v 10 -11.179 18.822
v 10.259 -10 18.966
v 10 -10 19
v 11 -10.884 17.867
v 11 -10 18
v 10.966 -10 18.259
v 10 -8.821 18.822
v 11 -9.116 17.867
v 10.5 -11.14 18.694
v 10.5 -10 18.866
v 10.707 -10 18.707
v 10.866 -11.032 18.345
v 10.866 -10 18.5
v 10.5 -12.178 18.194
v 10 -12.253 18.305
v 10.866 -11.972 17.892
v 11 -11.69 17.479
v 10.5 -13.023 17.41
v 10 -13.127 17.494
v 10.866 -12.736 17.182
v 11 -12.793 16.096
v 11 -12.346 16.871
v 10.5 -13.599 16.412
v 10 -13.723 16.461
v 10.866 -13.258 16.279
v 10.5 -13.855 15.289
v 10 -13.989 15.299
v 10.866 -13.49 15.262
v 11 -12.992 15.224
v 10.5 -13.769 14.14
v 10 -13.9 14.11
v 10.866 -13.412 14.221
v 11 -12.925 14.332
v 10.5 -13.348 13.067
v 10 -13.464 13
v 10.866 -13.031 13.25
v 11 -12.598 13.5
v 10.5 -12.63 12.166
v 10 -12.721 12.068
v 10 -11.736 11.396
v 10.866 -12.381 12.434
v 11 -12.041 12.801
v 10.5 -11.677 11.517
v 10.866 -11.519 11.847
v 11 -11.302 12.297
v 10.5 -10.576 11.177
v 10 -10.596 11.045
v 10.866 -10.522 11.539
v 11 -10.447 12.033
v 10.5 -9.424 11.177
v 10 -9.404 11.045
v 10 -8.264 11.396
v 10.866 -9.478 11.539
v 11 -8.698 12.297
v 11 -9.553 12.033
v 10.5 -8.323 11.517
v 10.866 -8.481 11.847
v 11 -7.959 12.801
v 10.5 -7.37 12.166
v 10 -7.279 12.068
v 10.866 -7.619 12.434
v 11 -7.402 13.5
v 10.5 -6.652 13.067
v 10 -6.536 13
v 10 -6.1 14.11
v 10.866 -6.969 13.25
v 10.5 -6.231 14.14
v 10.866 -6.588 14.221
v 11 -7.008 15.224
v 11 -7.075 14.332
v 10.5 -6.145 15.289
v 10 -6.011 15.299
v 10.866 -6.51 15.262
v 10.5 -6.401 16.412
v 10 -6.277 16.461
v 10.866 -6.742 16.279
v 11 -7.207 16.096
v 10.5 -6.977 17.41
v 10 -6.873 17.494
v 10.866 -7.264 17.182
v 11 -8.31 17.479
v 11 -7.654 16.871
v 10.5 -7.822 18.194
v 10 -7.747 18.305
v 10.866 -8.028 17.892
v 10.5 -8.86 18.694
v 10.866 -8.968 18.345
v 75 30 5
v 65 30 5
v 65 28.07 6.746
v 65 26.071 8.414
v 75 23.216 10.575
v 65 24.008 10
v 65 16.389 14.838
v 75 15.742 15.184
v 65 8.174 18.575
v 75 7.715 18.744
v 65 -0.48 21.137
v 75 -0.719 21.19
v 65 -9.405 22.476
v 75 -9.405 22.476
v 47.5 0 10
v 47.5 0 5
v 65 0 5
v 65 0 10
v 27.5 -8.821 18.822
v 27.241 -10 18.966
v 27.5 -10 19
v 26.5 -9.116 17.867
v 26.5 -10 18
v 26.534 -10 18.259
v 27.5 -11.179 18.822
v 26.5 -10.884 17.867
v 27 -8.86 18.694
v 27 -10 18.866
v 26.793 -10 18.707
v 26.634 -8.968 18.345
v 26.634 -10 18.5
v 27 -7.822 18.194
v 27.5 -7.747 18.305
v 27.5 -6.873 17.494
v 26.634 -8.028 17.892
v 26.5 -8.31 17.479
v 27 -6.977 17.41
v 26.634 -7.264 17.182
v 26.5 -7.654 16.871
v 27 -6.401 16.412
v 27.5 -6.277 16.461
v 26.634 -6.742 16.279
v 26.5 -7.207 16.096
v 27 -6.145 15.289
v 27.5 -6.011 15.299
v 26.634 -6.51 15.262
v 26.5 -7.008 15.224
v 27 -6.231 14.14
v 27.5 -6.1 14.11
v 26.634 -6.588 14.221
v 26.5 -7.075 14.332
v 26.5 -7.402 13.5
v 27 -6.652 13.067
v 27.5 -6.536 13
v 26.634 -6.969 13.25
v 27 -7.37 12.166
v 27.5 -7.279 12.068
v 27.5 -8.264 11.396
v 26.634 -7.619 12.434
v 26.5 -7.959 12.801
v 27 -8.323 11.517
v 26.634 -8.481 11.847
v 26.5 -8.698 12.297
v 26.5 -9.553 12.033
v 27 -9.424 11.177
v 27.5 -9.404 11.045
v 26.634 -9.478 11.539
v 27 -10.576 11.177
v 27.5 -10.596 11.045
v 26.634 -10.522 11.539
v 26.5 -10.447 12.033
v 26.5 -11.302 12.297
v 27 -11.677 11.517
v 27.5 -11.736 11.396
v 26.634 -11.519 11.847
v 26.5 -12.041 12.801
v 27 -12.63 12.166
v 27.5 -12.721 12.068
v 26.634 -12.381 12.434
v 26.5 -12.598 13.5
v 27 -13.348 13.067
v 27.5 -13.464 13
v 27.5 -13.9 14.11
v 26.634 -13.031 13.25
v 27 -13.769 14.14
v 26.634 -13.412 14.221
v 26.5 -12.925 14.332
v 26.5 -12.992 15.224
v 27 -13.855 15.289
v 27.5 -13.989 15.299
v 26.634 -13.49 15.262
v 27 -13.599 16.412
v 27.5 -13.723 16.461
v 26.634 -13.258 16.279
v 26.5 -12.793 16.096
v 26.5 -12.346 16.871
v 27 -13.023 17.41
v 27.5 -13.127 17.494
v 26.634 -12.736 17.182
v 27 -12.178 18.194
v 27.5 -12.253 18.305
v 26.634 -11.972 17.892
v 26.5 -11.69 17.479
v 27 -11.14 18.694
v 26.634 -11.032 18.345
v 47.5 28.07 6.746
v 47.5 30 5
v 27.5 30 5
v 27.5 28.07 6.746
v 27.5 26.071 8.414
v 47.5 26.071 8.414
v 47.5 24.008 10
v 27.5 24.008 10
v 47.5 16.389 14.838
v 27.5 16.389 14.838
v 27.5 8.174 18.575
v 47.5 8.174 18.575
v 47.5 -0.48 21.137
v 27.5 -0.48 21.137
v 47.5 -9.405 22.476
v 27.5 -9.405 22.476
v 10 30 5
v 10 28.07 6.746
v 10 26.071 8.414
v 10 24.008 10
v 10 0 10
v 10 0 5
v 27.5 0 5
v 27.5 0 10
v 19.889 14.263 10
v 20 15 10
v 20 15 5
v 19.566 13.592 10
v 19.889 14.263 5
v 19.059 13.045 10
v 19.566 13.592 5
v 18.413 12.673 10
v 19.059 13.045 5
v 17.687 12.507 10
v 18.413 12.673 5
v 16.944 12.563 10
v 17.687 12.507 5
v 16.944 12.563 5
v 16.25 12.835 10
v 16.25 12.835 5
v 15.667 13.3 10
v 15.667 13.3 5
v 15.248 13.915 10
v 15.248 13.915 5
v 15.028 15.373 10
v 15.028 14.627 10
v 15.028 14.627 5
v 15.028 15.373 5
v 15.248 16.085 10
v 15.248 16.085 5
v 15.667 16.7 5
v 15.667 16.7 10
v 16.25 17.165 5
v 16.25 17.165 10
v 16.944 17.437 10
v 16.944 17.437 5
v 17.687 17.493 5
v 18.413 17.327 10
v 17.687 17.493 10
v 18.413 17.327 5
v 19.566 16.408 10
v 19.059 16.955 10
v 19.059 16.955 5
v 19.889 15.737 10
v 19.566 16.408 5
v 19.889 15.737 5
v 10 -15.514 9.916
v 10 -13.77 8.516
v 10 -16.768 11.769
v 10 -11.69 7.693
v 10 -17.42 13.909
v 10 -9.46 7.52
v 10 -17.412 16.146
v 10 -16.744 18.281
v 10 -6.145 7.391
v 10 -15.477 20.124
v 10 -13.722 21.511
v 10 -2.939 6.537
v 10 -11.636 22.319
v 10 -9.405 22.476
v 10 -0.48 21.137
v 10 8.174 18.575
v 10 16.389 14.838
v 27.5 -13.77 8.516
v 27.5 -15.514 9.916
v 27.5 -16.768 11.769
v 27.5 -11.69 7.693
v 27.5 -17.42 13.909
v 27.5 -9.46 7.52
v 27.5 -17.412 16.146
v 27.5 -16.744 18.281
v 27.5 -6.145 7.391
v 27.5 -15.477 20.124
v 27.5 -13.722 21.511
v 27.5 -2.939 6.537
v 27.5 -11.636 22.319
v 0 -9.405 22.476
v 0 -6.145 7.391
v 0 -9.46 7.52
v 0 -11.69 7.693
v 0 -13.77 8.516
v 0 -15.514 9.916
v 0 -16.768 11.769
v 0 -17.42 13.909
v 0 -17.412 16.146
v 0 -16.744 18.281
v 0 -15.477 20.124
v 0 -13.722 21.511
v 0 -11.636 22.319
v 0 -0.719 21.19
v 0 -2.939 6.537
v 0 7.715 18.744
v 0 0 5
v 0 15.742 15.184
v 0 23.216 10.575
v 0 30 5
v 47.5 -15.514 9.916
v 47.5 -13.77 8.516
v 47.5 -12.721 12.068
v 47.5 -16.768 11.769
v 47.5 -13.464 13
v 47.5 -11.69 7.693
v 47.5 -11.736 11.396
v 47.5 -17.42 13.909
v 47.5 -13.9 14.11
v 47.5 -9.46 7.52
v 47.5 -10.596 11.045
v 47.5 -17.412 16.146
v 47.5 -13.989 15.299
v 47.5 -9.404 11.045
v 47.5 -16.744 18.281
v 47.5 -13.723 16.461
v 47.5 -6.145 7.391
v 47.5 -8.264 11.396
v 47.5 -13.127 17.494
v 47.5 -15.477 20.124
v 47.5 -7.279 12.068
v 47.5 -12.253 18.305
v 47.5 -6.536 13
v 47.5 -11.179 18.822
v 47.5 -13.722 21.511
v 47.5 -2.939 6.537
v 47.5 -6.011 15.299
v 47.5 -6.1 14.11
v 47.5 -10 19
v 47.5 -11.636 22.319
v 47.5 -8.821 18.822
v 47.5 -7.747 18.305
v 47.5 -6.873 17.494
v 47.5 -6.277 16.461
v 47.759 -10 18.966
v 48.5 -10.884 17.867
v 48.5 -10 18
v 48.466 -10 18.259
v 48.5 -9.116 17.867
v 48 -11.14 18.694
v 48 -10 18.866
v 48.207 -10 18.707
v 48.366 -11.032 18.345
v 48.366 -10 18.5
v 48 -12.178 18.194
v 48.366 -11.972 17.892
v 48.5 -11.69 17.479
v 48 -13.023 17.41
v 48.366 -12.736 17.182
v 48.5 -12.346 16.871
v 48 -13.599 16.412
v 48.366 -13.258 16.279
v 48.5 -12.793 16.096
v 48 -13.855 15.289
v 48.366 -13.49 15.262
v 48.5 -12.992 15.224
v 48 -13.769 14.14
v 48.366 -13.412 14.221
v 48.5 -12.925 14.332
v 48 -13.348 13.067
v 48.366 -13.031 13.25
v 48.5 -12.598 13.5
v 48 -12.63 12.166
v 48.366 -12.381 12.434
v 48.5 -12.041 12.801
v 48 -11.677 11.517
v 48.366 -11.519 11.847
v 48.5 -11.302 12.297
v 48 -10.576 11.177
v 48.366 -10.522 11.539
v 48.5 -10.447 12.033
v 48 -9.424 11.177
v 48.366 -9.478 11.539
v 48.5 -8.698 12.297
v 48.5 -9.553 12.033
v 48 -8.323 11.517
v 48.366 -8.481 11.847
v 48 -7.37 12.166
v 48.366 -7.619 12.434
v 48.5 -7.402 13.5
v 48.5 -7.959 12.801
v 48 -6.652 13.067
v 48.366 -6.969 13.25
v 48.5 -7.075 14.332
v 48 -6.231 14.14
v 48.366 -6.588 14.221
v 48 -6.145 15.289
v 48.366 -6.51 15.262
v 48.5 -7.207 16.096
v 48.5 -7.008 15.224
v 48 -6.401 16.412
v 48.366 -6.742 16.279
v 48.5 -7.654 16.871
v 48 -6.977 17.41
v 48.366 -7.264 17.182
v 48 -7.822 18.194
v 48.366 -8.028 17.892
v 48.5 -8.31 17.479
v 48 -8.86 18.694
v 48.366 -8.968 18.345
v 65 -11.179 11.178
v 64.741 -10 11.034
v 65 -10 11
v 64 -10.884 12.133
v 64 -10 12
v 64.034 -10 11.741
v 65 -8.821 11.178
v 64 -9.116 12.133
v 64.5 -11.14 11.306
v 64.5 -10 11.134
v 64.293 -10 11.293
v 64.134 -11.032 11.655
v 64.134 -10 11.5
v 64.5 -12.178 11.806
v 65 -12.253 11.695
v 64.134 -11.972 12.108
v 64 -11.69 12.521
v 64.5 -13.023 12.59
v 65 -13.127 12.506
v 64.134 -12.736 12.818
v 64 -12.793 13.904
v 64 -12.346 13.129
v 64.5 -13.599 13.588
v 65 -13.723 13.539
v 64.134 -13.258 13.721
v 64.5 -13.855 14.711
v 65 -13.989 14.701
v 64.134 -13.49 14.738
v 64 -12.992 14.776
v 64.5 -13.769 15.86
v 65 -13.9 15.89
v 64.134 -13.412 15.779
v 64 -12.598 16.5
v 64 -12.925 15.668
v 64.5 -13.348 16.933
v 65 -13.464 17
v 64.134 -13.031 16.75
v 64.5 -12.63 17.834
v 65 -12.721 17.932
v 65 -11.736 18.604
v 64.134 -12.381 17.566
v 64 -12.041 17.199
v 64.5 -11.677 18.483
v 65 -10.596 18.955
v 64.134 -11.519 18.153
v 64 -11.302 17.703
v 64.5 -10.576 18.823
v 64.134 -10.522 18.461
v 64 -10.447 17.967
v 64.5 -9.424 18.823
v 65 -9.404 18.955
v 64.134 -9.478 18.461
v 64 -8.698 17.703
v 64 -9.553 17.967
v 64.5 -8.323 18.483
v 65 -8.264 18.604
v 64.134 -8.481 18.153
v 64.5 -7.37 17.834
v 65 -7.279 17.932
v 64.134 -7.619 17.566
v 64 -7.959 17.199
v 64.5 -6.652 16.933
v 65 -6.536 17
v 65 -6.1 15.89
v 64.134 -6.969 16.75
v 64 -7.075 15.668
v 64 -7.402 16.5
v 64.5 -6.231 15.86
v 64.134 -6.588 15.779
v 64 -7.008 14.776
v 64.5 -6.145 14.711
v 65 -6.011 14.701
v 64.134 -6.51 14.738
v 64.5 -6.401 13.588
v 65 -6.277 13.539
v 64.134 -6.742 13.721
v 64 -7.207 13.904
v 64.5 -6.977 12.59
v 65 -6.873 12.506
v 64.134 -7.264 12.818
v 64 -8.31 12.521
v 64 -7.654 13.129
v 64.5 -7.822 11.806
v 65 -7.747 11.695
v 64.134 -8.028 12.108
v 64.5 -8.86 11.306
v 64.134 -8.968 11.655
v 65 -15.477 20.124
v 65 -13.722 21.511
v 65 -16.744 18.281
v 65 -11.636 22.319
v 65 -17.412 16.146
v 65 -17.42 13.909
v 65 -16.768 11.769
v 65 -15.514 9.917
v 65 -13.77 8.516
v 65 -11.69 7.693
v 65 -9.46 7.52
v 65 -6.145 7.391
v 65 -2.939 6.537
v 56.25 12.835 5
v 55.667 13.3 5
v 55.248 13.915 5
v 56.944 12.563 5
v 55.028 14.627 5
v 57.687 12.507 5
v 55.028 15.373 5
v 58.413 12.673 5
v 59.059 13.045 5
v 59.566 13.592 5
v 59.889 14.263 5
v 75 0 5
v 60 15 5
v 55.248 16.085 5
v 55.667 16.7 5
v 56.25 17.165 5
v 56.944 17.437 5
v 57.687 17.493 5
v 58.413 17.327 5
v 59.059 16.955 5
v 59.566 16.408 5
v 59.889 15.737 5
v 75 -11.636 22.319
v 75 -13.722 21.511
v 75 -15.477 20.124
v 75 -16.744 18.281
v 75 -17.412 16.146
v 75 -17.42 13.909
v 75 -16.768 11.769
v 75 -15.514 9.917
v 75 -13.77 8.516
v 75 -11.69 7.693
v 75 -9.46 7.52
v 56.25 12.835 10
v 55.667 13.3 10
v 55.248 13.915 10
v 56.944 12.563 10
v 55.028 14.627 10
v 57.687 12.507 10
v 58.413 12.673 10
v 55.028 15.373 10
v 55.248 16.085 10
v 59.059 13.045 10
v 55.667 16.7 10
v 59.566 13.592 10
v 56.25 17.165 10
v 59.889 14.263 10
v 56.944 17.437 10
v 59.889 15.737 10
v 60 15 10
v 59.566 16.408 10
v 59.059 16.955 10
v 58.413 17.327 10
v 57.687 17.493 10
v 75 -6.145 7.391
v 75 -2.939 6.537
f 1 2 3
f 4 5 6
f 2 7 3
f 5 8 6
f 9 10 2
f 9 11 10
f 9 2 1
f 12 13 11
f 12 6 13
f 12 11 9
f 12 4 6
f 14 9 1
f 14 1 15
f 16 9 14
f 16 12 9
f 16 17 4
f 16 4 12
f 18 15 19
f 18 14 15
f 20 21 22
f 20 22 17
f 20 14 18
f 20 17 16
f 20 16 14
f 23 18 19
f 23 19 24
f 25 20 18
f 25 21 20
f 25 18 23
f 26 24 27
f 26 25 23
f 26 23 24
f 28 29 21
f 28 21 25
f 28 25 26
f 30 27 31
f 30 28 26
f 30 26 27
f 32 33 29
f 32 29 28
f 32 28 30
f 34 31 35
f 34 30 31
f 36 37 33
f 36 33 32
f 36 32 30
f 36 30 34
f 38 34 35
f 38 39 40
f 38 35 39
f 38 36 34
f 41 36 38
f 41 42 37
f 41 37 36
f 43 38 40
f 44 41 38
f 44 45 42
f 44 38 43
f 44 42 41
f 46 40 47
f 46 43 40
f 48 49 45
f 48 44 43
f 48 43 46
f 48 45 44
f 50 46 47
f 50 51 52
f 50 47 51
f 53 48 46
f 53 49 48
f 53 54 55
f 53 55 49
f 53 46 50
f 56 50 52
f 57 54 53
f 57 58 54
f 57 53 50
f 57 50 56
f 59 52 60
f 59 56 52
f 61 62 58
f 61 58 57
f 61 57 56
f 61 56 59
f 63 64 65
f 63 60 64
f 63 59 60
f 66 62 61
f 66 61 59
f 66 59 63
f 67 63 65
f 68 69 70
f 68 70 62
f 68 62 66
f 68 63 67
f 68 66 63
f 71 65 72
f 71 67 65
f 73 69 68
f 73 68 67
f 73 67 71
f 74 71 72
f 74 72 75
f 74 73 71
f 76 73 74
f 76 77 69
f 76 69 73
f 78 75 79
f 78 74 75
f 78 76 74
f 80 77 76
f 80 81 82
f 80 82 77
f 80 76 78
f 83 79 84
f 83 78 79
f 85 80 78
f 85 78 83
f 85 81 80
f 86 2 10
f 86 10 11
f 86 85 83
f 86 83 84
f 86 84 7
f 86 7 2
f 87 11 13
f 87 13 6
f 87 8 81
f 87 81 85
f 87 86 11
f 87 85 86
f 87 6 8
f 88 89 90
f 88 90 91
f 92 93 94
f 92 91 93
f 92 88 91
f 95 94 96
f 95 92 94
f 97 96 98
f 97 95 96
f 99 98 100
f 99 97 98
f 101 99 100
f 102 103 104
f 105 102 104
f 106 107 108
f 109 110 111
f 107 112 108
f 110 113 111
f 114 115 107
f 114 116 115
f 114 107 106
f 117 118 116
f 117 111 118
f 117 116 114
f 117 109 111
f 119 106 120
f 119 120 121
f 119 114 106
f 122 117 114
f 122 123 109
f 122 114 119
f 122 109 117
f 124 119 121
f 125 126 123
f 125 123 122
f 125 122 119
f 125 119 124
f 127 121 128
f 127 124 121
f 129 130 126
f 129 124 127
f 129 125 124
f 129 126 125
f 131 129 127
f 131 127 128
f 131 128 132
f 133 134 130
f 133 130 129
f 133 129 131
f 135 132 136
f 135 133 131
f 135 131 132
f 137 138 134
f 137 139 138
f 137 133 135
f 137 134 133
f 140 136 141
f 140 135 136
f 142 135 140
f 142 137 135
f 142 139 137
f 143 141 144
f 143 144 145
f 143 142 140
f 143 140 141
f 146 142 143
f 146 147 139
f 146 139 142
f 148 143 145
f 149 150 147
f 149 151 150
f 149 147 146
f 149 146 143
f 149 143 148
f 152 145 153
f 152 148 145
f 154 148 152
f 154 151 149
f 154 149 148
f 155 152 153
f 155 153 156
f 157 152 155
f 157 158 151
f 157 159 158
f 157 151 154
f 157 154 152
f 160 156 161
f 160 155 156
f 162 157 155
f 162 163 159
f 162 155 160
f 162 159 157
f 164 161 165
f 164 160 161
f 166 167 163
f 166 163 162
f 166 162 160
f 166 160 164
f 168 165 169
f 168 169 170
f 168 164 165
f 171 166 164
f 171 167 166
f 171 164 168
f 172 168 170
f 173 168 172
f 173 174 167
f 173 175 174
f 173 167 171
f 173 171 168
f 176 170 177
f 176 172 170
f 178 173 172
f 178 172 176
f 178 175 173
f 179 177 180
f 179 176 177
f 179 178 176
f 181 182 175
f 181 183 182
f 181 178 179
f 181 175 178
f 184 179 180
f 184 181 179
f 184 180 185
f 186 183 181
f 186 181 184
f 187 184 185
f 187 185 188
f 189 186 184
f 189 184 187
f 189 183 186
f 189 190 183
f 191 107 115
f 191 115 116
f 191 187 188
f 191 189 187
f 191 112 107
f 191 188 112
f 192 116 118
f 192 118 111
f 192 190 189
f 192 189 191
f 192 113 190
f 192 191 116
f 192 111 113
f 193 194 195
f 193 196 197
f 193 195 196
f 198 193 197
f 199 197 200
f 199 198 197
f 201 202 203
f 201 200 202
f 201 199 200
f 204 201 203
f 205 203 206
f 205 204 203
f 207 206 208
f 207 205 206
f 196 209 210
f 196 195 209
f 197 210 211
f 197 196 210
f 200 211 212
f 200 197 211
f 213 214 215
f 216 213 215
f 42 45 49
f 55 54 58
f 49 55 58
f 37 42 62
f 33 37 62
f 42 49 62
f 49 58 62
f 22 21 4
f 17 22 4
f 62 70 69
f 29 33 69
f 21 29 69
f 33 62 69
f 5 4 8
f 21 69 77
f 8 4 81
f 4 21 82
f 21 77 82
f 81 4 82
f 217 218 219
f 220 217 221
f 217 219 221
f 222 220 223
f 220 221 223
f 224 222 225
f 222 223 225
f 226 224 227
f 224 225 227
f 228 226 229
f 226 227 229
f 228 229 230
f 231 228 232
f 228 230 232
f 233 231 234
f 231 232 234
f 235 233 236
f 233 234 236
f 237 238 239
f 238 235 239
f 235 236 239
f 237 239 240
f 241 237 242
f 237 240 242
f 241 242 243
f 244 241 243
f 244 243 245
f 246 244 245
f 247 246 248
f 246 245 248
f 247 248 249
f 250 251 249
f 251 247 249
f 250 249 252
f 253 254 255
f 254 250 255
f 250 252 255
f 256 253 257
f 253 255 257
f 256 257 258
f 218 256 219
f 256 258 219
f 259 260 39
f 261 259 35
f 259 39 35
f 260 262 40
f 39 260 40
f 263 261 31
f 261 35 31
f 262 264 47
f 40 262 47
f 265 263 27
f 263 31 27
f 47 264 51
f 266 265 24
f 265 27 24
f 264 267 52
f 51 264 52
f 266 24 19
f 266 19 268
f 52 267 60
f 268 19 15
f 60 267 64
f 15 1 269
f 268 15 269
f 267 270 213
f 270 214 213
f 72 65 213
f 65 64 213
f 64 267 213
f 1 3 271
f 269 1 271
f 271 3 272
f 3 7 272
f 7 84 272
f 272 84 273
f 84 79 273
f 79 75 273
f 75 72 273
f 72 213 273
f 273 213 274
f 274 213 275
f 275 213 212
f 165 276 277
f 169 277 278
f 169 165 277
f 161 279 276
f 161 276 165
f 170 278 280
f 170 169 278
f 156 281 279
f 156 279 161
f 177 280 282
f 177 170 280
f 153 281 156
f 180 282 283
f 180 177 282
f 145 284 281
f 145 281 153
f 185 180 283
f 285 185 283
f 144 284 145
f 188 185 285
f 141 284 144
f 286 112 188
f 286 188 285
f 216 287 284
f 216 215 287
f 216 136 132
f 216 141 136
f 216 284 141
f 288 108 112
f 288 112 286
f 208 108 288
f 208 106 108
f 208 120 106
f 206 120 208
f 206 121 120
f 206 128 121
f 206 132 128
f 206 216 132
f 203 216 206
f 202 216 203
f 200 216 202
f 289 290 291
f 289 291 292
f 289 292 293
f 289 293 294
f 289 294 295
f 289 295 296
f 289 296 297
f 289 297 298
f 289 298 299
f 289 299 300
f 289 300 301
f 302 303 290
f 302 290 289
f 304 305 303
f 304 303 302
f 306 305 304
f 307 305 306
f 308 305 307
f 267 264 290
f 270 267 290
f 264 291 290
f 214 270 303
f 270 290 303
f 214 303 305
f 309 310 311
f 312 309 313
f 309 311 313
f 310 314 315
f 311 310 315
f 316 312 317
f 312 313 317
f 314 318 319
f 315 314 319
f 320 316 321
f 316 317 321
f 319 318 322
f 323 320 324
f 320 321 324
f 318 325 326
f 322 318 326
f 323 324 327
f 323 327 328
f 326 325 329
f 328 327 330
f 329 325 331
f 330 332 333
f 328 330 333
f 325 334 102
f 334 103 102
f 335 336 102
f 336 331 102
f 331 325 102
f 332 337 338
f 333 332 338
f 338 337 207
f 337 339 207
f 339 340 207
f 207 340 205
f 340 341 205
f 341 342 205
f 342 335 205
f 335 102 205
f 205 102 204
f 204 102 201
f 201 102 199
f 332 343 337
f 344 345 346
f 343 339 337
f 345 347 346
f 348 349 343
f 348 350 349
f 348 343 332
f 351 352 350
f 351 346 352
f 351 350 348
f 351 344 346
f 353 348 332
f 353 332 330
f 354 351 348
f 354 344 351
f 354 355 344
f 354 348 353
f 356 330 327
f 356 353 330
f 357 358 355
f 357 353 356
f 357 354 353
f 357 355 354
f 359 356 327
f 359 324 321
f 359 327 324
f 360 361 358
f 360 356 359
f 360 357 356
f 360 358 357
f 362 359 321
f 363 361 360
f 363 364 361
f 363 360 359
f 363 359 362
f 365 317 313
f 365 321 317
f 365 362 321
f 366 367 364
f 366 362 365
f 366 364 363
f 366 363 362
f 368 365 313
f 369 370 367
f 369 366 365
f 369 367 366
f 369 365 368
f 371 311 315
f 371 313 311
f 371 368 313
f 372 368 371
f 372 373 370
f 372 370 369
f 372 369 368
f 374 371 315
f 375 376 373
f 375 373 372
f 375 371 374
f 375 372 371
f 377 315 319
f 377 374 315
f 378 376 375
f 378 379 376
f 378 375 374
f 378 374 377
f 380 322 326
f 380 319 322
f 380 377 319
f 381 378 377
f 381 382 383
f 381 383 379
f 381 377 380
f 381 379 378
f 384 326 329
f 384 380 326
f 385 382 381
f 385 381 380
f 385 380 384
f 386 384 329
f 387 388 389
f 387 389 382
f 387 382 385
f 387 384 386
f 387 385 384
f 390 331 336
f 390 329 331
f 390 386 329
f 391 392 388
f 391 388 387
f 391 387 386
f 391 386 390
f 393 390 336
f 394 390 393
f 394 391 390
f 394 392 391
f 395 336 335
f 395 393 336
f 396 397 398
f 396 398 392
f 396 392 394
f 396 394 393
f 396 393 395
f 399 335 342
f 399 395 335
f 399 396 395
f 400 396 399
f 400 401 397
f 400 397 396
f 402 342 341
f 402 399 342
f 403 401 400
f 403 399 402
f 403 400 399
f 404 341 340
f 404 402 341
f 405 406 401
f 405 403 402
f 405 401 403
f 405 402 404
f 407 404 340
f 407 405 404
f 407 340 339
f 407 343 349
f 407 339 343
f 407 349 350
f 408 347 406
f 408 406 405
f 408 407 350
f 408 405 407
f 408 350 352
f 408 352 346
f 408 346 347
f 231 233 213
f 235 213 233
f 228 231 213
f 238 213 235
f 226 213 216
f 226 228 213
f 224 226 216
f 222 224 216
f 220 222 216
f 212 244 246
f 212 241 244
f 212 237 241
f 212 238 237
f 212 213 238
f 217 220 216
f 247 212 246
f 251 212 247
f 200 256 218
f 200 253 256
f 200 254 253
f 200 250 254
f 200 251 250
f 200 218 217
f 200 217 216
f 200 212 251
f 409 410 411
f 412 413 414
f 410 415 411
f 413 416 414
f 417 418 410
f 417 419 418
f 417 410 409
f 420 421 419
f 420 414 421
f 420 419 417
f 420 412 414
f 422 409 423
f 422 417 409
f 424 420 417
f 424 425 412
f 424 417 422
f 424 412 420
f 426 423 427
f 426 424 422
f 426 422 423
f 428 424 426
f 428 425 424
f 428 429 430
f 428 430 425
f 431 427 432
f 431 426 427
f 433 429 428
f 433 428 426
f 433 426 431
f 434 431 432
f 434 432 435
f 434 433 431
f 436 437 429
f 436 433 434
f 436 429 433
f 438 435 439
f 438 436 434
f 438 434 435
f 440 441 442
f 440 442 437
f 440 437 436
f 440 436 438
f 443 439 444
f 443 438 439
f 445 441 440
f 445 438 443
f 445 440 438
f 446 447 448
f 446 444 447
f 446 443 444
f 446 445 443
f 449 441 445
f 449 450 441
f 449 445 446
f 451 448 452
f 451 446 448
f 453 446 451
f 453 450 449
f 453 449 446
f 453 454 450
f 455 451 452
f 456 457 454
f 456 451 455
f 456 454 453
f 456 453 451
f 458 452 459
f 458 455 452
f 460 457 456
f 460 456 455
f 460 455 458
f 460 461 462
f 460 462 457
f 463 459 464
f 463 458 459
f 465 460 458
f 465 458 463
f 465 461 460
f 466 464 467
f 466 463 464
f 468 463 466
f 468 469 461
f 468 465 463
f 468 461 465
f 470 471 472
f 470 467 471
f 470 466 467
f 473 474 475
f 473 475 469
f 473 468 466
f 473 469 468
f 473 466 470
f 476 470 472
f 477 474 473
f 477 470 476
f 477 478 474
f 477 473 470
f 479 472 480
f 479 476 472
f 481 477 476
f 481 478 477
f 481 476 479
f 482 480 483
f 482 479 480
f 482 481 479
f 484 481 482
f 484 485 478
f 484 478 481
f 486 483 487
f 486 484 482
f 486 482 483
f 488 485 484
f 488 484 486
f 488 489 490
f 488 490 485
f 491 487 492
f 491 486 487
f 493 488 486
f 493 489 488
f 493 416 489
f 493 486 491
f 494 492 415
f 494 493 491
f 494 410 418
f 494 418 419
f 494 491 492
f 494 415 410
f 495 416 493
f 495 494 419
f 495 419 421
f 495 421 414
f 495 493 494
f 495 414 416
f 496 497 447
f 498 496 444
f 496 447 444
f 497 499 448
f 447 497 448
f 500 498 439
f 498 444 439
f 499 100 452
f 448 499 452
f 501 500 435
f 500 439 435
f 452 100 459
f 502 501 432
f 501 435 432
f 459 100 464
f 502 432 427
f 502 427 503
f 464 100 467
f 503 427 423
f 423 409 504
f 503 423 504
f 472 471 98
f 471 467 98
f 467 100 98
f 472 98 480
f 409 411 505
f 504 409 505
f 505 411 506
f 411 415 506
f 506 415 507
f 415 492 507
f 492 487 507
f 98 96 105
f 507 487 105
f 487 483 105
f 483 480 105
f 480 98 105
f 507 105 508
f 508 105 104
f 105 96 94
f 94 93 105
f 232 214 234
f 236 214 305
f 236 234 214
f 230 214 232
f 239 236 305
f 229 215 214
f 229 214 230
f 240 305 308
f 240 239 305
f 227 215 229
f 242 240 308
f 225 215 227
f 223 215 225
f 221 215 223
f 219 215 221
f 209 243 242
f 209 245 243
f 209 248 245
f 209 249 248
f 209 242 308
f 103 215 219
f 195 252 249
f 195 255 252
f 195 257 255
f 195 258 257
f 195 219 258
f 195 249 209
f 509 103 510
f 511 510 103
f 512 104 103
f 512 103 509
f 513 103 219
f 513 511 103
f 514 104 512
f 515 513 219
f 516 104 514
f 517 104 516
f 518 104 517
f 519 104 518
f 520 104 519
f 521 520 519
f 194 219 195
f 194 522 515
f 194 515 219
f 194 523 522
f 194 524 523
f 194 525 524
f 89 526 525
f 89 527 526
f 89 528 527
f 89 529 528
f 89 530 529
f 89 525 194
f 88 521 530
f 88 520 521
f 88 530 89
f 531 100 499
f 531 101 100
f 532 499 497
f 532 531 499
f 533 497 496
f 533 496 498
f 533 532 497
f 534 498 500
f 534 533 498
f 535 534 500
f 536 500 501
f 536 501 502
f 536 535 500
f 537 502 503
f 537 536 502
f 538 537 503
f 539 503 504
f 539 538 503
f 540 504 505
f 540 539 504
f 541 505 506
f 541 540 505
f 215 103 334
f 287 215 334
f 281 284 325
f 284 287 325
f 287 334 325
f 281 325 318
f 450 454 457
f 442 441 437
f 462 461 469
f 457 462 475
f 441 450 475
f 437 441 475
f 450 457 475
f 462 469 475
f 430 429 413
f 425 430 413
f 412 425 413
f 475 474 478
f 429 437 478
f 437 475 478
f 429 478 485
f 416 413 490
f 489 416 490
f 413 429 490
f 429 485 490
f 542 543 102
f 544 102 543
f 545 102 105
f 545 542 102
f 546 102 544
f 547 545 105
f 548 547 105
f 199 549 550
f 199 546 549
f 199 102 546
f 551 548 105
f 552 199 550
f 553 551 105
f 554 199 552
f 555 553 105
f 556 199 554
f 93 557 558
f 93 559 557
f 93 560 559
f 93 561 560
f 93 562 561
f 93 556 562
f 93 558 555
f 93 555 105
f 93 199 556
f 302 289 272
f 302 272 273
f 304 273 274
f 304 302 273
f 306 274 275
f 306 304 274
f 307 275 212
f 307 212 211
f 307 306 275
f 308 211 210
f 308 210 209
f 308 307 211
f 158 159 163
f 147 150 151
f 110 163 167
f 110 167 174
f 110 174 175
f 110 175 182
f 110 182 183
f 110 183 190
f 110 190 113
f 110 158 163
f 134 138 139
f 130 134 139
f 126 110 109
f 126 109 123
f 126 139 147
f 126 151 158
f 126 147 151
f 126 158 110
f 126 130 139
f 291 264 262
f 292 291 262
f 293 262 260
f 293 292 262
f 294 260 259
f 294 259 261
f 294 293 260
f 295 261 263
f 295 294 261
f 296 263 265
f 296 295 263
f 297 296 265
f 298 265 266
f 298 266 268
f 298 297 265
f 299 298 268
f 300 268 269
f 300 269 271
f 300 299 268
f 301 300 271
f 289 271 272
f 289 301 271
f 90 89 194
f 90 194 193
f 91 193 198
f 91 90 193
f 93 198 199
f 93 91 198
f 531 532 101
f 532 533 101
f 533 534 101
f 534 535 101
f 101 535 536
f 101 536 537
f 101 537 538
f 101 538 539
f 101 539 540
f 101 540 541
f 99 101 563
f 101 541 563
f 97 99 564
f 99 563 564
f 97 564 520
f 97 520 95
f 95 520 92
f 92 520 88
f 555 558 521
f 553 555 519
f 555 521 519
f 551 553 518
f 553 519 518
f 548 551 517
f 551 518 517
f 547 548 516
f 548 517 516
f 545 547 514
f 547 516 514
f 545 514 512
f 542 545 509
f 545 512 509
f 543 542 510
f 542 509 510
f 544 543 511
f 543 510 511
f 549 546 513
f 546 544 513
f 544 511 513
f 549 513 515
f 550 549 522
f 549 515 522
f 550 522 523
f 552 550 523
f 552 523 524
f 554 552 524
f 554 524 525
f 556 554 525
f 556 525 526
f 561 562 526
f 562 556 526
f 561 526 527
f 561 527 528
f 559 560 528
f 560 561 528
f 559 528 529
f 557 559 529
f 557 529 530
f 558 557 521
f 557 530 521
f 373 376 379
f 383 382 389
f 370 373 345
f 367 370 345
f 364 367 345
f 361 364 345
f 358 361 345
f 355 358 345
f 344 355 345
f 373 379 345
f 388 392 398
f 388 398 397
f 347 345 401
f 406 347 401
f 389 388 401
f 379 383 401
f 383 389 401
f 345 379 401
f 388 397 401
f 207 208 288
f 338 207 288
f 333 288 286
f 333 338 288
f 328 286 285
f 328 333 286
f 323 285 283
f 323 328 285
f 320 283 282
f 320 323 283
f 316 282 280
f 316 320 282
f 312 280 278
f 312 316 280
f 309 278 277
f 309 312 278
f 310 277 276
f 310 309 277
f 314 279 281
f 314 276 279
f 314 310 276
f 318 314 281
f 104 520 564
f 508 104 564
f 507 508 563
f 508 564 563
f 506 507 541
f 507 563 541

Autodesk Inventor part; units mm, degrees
ref_plane "YZ Plane" through (0, 0, 0) normal (1, 0, 0) x (0, 1, 0)
ref_plane "XZ Plane" through (0, 0, 0) normal (0, 1, 0) x (-1, 0, 0)
sketch "Sketch1" plane through (0, 0, 0) normal (0, 0, 1) x (1, 0, 0)
  line L0 (0, 0) -> (75, 0)
  line L1 (75, 0) -> (75, 30)
  line L2 (75, 30) -> (0, 30)
  line L3 (0, 30) -> (0, 0)
  circle A0 centre (17.5, 15) radius 2.5
  circle A1 centre (57.5, 15) radius 2.5
  line L4 (17.5, 15) -> (57.5, 15) construction
  point P0 (37.5, 15)
  point P1 (37.5, 30)
  dimension "d0" = 75
  dimension "d1" = 30
  dimension "d2" = 5
  dimension "d3" = 5
  dimension "d4" = 40
  dimension "d5" = 15
extrude "Extrusion1" add sketch "Sketch1" along normal blind 5
sketch "Sketch2" plane through (75, 0, 0) normal (1, 0, 0) x (0, 0, -1)
  circle A0 centre (-15, -10) radius 4
  circle A1 centre (-15, -10) radius 7.5 construction
  line L0 (-5, 0) -> (-5, 30) construction
  arc A2 (-5, 30) -> (-22.4763, -9.4047) centre (42.3186, -14.564) ccw
  arc A3 (-5, 0) -> (-7.5195, -9.4597) centre (7.4415, -8.379) ccw
  arc A4 (-22.4763, -9.4047) -> (-7.5195, -9.4597) centre (-15, -10) ccw
  line L1 (0, 0) -> (-5, 0) projected
  line L2 (0, 30) -> (-5, 30) projected
  line L3 (-5, 30) -> (-5, 0)
  dimension "d8" = 8
  dimension "d9" = 15
  dimension "d10" = 10
  dimension "d11" = 10
  dimension "d12" = 65
  dimension "d13" = 15
extrude "Extrusion2" add sketch "Sketch2" against normal blind 10
sketch "Sketch3" plane through (0, 0, 0) normal (-1, 0, 0) x (0, 0, 1)
  circle A0 centre (15, -10) radius 4 projected
  arc A1 (7.5195, -9.4597) -> (5, 0) centre (-7.4415, -8.379) ccw projected
  arc A2 (7.5195, -9.4597) -> (22.4763, -9.4047) centre (15, -10) ccw projected
  arc A3 (22.4763, -9.4047) -> (5, 30) centre (-42.3186, -14.564) ccw projected
  line L0 (5, 0) -> (5, 30) projected
  point P0 (0, 0)
extrude "Extrusion3" add sketch "Sketch3" against normal blind 10
ref_plane "Work Plane1" through (37.5, 0, 0) normal (-1, 0, 0) x (0, 0, 1)
sketch "Sketch4" plane through (37.5, 0, 0) normal (-1, 0, 0) x (0, 0, 1)
  circle A0 centre (15, -10) radius 4 projected
  arc A1 (7.5195, -9.4597) -> (5, 0) centre (-7.4415, -8.379) ccw projected
  arc A2 (7.5195, -9.4597) -> (22.4763, -9.4047) centre (15, -10) ccw projected
  arc A3 (22.4763, -9.4047) -> (5, 30) centre (-42.3186, -14.564) ccw projected
  line L0 (5, 0) -> (5, 30) projected
  point P0 (0, 0)
extrude "Extrusion4" add sketch "Sketch4" along normal mid plane 20
sketch "Sketch5" plane through (0, 0, 5) normal (0, 0, 1) x (1, 0, 0)
  circle A0 centre (17.5, 15) radius 2.5 projected
  line L0 (27.5, 0) -> (27.5, 30) projected
  line L1 (27.5, 30) -> (10, 30) projected
  line L2 (10, 30) -> (10, 0) projected
  line L3 (10, 0) -> (27.5, 0) projected
  line L4 (47.5, 30) -> (47.5, 0) projected
  line L5 (47.5, 0) -> (65, 0) projected
  line L6 (65, 0) -> (65, 30) projected
  line L7 (65, 30) -> (47.5, 30) projected
  circle A1 centre (57.5, 15) radius 2.5 projected
  point P0 (0, 0)
extrude "Extrusion5" add sketch "Sketch5" along normal blind 5
sketch "Sketch6" plane through (75, 0, 0) normal (1, 0, 0) x (0, 0, -1)
  line L0 (0, 0) -> (-5, 0) projected
  line L1 (0, 30) -> (-5, 30) projected
  line L2 (0, 0) -> (-5, 0)
  line L3 (-5, 0) -> (-5, 30)
  line L4 (-5, 30) -> (0, 30)
  line L5 (0, 30) -> (0, 0)
  arc A0 (-5, 30) -> (-10, 24.0076) centre (42.3186, -14.564) ccw projected
  line L6 (-5, 30) -> (-10, 30) projected
  line L7 (-10, 24.0076) -> (-10, 30) projected
extrude "Extrusion6" cut sketch "Sketch6" against normal through all
sketch "Sketch7" plane through (0, 0, 5) normal (-1, 0, 0) x (0, 0, 1)
  circle A0 centre (10, -10) radius 4 projected
  point P0 (-5, 0)
extrude "Extrusion7" add sketch "Sketch7" against normal blind 11
sketch "Sketch8" plane through (27.5, 0, 0) normal (-1, 0, 0) x (0, 0, 1)
  line L0 (10, 24.0076) -> (10, 0) projected
  line L1 (10, 0) -> (5, 0) projected
  arc A0 (7.5195, -9.4597) -> (5, 0) centre (-7.4415, -8.379) ccw projected
  arc A1 (7.5195, -9.4597) -> (22.4763, -9.4047) centre (15, -10) ccw projected
  arc A2 (22.4763, -9.4047) -> (10, 24.0076) centre (-42.3186, -14.564) ccw projected
  circle A3 centre (15, -10) radius 4 projected
  point P0 (0, 0)
extrude "Extrusion8" add sketch "Sketch8" along normal blind 1 and the other way blind 21 contours A3
sketch "Sketch9" plane through (75, 0, 5) normal (1, 0, 0) x (0, 0, -1)
  circle A0 centre (-10, -10) radius 4 projected
  point P0 (5, 0)
extrude "Extrusion9" add sketch "Sketch9" against normal blind 11
fillet "Fillet1" radius 1 4 edges at (11, -10, 11) (26.5, -10, 11) (48.5, -10, 11) (64, -10, 19)
properties part number "TC006b" material "ABS Plastic"
